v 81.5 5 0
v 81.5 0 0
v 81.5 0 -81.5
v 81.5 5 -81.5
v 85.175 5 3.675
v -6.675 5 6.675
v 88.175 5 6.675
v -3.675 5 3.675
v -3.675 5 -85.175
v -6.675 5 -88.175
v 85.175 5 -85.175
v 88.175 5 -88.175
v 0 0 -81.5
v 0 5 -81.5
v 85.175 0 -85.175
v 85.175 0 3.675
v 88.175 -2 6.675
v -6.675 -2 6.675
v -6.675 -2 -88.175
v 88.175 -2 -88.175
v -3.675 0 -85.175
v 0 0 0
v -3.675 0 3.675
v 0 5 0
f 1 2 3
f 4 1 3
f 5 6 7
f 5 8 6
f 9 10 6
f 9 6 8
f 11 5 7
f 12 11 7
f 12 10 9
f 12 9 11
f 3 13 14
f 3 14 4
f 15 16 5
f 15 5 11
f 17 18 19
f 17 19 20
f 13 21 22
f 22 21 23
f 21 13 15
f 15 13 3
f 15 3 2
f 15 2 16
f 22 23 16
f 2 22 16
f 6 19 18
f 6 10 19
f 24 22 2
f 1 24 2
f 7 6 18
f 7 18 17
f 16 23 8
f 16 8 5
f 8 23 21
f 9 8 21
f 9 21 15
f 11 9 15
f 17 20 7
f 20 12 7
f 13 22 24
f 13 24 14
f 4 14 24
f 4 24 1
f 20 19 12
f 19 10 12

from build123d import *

# Parameters (mm, degrees)
SKETCH1_W             = 94.85
SKETCH1_H             = 94.85
SKETCH1_W_2           = 88.85
SKETCH1_H_2           = 88.85
BOSS_EXTRUDE1_DEPTH   = 5
SKETCH1_W_3           = 81.5
SKETCH1_H_3           = 81.5
BOSS_EXTRUDE1_2_DEPTH = 5
SKETCH2_W             = 94.85
SKETCH2_H             = 94.85
BOSS_EXTRUDE2_DEPTH   = 2


with BuildPart() as part:
    # Sketch1 → Boss-Extrude1 (new body)
    with BuildSketch(Plane(origin=(0, 0, 0), x_dir=(1, 0, 0), z_dir=(0, 1, 0))):
        with Locations((40.75, 40.75)):
            Rectangle(SKETCH1_W, SKETCH1_H)
        with Locations((40.75, 40.75)):
            Rectangle(SKETCH1_W_2, SKETCH1_H_2, mode=Mode.SUBTRACT)
    extrude(amount=BOSS_EXTRUDE1_DEPTH)



with BuildPart() as body_2:
    # Sketch1 → Boss-Extrude1 2 (new body)
    with BuildSketch(Plane(origin=(0, 0, 0), x_dir=(1, 0, 0), z_dir=(0, 1, 0))):
        with Locations((40.75, 40.75)):
            Rectangle(SKETCH1_W_3, SKETCH1_H_3)
    extrude(amount=BOSS_EXTRUDE1_2_DEPTH)


with BuildPart() as part_1:
    add(part.part)

    add(body_2.part)  # Boss-Extrude2 merges body 2
    # Sketch2 → Boss-Extrude2 (add)
    with BuildSketch(Plane.XZ):
        with Locations((40.75, -40.75)):
            Rectangle(SKETCH2_W, SKETCH2_H)
    extrude(amount=BOSS_EXTRUDE2_DEPTH)


solid = part_1.part
